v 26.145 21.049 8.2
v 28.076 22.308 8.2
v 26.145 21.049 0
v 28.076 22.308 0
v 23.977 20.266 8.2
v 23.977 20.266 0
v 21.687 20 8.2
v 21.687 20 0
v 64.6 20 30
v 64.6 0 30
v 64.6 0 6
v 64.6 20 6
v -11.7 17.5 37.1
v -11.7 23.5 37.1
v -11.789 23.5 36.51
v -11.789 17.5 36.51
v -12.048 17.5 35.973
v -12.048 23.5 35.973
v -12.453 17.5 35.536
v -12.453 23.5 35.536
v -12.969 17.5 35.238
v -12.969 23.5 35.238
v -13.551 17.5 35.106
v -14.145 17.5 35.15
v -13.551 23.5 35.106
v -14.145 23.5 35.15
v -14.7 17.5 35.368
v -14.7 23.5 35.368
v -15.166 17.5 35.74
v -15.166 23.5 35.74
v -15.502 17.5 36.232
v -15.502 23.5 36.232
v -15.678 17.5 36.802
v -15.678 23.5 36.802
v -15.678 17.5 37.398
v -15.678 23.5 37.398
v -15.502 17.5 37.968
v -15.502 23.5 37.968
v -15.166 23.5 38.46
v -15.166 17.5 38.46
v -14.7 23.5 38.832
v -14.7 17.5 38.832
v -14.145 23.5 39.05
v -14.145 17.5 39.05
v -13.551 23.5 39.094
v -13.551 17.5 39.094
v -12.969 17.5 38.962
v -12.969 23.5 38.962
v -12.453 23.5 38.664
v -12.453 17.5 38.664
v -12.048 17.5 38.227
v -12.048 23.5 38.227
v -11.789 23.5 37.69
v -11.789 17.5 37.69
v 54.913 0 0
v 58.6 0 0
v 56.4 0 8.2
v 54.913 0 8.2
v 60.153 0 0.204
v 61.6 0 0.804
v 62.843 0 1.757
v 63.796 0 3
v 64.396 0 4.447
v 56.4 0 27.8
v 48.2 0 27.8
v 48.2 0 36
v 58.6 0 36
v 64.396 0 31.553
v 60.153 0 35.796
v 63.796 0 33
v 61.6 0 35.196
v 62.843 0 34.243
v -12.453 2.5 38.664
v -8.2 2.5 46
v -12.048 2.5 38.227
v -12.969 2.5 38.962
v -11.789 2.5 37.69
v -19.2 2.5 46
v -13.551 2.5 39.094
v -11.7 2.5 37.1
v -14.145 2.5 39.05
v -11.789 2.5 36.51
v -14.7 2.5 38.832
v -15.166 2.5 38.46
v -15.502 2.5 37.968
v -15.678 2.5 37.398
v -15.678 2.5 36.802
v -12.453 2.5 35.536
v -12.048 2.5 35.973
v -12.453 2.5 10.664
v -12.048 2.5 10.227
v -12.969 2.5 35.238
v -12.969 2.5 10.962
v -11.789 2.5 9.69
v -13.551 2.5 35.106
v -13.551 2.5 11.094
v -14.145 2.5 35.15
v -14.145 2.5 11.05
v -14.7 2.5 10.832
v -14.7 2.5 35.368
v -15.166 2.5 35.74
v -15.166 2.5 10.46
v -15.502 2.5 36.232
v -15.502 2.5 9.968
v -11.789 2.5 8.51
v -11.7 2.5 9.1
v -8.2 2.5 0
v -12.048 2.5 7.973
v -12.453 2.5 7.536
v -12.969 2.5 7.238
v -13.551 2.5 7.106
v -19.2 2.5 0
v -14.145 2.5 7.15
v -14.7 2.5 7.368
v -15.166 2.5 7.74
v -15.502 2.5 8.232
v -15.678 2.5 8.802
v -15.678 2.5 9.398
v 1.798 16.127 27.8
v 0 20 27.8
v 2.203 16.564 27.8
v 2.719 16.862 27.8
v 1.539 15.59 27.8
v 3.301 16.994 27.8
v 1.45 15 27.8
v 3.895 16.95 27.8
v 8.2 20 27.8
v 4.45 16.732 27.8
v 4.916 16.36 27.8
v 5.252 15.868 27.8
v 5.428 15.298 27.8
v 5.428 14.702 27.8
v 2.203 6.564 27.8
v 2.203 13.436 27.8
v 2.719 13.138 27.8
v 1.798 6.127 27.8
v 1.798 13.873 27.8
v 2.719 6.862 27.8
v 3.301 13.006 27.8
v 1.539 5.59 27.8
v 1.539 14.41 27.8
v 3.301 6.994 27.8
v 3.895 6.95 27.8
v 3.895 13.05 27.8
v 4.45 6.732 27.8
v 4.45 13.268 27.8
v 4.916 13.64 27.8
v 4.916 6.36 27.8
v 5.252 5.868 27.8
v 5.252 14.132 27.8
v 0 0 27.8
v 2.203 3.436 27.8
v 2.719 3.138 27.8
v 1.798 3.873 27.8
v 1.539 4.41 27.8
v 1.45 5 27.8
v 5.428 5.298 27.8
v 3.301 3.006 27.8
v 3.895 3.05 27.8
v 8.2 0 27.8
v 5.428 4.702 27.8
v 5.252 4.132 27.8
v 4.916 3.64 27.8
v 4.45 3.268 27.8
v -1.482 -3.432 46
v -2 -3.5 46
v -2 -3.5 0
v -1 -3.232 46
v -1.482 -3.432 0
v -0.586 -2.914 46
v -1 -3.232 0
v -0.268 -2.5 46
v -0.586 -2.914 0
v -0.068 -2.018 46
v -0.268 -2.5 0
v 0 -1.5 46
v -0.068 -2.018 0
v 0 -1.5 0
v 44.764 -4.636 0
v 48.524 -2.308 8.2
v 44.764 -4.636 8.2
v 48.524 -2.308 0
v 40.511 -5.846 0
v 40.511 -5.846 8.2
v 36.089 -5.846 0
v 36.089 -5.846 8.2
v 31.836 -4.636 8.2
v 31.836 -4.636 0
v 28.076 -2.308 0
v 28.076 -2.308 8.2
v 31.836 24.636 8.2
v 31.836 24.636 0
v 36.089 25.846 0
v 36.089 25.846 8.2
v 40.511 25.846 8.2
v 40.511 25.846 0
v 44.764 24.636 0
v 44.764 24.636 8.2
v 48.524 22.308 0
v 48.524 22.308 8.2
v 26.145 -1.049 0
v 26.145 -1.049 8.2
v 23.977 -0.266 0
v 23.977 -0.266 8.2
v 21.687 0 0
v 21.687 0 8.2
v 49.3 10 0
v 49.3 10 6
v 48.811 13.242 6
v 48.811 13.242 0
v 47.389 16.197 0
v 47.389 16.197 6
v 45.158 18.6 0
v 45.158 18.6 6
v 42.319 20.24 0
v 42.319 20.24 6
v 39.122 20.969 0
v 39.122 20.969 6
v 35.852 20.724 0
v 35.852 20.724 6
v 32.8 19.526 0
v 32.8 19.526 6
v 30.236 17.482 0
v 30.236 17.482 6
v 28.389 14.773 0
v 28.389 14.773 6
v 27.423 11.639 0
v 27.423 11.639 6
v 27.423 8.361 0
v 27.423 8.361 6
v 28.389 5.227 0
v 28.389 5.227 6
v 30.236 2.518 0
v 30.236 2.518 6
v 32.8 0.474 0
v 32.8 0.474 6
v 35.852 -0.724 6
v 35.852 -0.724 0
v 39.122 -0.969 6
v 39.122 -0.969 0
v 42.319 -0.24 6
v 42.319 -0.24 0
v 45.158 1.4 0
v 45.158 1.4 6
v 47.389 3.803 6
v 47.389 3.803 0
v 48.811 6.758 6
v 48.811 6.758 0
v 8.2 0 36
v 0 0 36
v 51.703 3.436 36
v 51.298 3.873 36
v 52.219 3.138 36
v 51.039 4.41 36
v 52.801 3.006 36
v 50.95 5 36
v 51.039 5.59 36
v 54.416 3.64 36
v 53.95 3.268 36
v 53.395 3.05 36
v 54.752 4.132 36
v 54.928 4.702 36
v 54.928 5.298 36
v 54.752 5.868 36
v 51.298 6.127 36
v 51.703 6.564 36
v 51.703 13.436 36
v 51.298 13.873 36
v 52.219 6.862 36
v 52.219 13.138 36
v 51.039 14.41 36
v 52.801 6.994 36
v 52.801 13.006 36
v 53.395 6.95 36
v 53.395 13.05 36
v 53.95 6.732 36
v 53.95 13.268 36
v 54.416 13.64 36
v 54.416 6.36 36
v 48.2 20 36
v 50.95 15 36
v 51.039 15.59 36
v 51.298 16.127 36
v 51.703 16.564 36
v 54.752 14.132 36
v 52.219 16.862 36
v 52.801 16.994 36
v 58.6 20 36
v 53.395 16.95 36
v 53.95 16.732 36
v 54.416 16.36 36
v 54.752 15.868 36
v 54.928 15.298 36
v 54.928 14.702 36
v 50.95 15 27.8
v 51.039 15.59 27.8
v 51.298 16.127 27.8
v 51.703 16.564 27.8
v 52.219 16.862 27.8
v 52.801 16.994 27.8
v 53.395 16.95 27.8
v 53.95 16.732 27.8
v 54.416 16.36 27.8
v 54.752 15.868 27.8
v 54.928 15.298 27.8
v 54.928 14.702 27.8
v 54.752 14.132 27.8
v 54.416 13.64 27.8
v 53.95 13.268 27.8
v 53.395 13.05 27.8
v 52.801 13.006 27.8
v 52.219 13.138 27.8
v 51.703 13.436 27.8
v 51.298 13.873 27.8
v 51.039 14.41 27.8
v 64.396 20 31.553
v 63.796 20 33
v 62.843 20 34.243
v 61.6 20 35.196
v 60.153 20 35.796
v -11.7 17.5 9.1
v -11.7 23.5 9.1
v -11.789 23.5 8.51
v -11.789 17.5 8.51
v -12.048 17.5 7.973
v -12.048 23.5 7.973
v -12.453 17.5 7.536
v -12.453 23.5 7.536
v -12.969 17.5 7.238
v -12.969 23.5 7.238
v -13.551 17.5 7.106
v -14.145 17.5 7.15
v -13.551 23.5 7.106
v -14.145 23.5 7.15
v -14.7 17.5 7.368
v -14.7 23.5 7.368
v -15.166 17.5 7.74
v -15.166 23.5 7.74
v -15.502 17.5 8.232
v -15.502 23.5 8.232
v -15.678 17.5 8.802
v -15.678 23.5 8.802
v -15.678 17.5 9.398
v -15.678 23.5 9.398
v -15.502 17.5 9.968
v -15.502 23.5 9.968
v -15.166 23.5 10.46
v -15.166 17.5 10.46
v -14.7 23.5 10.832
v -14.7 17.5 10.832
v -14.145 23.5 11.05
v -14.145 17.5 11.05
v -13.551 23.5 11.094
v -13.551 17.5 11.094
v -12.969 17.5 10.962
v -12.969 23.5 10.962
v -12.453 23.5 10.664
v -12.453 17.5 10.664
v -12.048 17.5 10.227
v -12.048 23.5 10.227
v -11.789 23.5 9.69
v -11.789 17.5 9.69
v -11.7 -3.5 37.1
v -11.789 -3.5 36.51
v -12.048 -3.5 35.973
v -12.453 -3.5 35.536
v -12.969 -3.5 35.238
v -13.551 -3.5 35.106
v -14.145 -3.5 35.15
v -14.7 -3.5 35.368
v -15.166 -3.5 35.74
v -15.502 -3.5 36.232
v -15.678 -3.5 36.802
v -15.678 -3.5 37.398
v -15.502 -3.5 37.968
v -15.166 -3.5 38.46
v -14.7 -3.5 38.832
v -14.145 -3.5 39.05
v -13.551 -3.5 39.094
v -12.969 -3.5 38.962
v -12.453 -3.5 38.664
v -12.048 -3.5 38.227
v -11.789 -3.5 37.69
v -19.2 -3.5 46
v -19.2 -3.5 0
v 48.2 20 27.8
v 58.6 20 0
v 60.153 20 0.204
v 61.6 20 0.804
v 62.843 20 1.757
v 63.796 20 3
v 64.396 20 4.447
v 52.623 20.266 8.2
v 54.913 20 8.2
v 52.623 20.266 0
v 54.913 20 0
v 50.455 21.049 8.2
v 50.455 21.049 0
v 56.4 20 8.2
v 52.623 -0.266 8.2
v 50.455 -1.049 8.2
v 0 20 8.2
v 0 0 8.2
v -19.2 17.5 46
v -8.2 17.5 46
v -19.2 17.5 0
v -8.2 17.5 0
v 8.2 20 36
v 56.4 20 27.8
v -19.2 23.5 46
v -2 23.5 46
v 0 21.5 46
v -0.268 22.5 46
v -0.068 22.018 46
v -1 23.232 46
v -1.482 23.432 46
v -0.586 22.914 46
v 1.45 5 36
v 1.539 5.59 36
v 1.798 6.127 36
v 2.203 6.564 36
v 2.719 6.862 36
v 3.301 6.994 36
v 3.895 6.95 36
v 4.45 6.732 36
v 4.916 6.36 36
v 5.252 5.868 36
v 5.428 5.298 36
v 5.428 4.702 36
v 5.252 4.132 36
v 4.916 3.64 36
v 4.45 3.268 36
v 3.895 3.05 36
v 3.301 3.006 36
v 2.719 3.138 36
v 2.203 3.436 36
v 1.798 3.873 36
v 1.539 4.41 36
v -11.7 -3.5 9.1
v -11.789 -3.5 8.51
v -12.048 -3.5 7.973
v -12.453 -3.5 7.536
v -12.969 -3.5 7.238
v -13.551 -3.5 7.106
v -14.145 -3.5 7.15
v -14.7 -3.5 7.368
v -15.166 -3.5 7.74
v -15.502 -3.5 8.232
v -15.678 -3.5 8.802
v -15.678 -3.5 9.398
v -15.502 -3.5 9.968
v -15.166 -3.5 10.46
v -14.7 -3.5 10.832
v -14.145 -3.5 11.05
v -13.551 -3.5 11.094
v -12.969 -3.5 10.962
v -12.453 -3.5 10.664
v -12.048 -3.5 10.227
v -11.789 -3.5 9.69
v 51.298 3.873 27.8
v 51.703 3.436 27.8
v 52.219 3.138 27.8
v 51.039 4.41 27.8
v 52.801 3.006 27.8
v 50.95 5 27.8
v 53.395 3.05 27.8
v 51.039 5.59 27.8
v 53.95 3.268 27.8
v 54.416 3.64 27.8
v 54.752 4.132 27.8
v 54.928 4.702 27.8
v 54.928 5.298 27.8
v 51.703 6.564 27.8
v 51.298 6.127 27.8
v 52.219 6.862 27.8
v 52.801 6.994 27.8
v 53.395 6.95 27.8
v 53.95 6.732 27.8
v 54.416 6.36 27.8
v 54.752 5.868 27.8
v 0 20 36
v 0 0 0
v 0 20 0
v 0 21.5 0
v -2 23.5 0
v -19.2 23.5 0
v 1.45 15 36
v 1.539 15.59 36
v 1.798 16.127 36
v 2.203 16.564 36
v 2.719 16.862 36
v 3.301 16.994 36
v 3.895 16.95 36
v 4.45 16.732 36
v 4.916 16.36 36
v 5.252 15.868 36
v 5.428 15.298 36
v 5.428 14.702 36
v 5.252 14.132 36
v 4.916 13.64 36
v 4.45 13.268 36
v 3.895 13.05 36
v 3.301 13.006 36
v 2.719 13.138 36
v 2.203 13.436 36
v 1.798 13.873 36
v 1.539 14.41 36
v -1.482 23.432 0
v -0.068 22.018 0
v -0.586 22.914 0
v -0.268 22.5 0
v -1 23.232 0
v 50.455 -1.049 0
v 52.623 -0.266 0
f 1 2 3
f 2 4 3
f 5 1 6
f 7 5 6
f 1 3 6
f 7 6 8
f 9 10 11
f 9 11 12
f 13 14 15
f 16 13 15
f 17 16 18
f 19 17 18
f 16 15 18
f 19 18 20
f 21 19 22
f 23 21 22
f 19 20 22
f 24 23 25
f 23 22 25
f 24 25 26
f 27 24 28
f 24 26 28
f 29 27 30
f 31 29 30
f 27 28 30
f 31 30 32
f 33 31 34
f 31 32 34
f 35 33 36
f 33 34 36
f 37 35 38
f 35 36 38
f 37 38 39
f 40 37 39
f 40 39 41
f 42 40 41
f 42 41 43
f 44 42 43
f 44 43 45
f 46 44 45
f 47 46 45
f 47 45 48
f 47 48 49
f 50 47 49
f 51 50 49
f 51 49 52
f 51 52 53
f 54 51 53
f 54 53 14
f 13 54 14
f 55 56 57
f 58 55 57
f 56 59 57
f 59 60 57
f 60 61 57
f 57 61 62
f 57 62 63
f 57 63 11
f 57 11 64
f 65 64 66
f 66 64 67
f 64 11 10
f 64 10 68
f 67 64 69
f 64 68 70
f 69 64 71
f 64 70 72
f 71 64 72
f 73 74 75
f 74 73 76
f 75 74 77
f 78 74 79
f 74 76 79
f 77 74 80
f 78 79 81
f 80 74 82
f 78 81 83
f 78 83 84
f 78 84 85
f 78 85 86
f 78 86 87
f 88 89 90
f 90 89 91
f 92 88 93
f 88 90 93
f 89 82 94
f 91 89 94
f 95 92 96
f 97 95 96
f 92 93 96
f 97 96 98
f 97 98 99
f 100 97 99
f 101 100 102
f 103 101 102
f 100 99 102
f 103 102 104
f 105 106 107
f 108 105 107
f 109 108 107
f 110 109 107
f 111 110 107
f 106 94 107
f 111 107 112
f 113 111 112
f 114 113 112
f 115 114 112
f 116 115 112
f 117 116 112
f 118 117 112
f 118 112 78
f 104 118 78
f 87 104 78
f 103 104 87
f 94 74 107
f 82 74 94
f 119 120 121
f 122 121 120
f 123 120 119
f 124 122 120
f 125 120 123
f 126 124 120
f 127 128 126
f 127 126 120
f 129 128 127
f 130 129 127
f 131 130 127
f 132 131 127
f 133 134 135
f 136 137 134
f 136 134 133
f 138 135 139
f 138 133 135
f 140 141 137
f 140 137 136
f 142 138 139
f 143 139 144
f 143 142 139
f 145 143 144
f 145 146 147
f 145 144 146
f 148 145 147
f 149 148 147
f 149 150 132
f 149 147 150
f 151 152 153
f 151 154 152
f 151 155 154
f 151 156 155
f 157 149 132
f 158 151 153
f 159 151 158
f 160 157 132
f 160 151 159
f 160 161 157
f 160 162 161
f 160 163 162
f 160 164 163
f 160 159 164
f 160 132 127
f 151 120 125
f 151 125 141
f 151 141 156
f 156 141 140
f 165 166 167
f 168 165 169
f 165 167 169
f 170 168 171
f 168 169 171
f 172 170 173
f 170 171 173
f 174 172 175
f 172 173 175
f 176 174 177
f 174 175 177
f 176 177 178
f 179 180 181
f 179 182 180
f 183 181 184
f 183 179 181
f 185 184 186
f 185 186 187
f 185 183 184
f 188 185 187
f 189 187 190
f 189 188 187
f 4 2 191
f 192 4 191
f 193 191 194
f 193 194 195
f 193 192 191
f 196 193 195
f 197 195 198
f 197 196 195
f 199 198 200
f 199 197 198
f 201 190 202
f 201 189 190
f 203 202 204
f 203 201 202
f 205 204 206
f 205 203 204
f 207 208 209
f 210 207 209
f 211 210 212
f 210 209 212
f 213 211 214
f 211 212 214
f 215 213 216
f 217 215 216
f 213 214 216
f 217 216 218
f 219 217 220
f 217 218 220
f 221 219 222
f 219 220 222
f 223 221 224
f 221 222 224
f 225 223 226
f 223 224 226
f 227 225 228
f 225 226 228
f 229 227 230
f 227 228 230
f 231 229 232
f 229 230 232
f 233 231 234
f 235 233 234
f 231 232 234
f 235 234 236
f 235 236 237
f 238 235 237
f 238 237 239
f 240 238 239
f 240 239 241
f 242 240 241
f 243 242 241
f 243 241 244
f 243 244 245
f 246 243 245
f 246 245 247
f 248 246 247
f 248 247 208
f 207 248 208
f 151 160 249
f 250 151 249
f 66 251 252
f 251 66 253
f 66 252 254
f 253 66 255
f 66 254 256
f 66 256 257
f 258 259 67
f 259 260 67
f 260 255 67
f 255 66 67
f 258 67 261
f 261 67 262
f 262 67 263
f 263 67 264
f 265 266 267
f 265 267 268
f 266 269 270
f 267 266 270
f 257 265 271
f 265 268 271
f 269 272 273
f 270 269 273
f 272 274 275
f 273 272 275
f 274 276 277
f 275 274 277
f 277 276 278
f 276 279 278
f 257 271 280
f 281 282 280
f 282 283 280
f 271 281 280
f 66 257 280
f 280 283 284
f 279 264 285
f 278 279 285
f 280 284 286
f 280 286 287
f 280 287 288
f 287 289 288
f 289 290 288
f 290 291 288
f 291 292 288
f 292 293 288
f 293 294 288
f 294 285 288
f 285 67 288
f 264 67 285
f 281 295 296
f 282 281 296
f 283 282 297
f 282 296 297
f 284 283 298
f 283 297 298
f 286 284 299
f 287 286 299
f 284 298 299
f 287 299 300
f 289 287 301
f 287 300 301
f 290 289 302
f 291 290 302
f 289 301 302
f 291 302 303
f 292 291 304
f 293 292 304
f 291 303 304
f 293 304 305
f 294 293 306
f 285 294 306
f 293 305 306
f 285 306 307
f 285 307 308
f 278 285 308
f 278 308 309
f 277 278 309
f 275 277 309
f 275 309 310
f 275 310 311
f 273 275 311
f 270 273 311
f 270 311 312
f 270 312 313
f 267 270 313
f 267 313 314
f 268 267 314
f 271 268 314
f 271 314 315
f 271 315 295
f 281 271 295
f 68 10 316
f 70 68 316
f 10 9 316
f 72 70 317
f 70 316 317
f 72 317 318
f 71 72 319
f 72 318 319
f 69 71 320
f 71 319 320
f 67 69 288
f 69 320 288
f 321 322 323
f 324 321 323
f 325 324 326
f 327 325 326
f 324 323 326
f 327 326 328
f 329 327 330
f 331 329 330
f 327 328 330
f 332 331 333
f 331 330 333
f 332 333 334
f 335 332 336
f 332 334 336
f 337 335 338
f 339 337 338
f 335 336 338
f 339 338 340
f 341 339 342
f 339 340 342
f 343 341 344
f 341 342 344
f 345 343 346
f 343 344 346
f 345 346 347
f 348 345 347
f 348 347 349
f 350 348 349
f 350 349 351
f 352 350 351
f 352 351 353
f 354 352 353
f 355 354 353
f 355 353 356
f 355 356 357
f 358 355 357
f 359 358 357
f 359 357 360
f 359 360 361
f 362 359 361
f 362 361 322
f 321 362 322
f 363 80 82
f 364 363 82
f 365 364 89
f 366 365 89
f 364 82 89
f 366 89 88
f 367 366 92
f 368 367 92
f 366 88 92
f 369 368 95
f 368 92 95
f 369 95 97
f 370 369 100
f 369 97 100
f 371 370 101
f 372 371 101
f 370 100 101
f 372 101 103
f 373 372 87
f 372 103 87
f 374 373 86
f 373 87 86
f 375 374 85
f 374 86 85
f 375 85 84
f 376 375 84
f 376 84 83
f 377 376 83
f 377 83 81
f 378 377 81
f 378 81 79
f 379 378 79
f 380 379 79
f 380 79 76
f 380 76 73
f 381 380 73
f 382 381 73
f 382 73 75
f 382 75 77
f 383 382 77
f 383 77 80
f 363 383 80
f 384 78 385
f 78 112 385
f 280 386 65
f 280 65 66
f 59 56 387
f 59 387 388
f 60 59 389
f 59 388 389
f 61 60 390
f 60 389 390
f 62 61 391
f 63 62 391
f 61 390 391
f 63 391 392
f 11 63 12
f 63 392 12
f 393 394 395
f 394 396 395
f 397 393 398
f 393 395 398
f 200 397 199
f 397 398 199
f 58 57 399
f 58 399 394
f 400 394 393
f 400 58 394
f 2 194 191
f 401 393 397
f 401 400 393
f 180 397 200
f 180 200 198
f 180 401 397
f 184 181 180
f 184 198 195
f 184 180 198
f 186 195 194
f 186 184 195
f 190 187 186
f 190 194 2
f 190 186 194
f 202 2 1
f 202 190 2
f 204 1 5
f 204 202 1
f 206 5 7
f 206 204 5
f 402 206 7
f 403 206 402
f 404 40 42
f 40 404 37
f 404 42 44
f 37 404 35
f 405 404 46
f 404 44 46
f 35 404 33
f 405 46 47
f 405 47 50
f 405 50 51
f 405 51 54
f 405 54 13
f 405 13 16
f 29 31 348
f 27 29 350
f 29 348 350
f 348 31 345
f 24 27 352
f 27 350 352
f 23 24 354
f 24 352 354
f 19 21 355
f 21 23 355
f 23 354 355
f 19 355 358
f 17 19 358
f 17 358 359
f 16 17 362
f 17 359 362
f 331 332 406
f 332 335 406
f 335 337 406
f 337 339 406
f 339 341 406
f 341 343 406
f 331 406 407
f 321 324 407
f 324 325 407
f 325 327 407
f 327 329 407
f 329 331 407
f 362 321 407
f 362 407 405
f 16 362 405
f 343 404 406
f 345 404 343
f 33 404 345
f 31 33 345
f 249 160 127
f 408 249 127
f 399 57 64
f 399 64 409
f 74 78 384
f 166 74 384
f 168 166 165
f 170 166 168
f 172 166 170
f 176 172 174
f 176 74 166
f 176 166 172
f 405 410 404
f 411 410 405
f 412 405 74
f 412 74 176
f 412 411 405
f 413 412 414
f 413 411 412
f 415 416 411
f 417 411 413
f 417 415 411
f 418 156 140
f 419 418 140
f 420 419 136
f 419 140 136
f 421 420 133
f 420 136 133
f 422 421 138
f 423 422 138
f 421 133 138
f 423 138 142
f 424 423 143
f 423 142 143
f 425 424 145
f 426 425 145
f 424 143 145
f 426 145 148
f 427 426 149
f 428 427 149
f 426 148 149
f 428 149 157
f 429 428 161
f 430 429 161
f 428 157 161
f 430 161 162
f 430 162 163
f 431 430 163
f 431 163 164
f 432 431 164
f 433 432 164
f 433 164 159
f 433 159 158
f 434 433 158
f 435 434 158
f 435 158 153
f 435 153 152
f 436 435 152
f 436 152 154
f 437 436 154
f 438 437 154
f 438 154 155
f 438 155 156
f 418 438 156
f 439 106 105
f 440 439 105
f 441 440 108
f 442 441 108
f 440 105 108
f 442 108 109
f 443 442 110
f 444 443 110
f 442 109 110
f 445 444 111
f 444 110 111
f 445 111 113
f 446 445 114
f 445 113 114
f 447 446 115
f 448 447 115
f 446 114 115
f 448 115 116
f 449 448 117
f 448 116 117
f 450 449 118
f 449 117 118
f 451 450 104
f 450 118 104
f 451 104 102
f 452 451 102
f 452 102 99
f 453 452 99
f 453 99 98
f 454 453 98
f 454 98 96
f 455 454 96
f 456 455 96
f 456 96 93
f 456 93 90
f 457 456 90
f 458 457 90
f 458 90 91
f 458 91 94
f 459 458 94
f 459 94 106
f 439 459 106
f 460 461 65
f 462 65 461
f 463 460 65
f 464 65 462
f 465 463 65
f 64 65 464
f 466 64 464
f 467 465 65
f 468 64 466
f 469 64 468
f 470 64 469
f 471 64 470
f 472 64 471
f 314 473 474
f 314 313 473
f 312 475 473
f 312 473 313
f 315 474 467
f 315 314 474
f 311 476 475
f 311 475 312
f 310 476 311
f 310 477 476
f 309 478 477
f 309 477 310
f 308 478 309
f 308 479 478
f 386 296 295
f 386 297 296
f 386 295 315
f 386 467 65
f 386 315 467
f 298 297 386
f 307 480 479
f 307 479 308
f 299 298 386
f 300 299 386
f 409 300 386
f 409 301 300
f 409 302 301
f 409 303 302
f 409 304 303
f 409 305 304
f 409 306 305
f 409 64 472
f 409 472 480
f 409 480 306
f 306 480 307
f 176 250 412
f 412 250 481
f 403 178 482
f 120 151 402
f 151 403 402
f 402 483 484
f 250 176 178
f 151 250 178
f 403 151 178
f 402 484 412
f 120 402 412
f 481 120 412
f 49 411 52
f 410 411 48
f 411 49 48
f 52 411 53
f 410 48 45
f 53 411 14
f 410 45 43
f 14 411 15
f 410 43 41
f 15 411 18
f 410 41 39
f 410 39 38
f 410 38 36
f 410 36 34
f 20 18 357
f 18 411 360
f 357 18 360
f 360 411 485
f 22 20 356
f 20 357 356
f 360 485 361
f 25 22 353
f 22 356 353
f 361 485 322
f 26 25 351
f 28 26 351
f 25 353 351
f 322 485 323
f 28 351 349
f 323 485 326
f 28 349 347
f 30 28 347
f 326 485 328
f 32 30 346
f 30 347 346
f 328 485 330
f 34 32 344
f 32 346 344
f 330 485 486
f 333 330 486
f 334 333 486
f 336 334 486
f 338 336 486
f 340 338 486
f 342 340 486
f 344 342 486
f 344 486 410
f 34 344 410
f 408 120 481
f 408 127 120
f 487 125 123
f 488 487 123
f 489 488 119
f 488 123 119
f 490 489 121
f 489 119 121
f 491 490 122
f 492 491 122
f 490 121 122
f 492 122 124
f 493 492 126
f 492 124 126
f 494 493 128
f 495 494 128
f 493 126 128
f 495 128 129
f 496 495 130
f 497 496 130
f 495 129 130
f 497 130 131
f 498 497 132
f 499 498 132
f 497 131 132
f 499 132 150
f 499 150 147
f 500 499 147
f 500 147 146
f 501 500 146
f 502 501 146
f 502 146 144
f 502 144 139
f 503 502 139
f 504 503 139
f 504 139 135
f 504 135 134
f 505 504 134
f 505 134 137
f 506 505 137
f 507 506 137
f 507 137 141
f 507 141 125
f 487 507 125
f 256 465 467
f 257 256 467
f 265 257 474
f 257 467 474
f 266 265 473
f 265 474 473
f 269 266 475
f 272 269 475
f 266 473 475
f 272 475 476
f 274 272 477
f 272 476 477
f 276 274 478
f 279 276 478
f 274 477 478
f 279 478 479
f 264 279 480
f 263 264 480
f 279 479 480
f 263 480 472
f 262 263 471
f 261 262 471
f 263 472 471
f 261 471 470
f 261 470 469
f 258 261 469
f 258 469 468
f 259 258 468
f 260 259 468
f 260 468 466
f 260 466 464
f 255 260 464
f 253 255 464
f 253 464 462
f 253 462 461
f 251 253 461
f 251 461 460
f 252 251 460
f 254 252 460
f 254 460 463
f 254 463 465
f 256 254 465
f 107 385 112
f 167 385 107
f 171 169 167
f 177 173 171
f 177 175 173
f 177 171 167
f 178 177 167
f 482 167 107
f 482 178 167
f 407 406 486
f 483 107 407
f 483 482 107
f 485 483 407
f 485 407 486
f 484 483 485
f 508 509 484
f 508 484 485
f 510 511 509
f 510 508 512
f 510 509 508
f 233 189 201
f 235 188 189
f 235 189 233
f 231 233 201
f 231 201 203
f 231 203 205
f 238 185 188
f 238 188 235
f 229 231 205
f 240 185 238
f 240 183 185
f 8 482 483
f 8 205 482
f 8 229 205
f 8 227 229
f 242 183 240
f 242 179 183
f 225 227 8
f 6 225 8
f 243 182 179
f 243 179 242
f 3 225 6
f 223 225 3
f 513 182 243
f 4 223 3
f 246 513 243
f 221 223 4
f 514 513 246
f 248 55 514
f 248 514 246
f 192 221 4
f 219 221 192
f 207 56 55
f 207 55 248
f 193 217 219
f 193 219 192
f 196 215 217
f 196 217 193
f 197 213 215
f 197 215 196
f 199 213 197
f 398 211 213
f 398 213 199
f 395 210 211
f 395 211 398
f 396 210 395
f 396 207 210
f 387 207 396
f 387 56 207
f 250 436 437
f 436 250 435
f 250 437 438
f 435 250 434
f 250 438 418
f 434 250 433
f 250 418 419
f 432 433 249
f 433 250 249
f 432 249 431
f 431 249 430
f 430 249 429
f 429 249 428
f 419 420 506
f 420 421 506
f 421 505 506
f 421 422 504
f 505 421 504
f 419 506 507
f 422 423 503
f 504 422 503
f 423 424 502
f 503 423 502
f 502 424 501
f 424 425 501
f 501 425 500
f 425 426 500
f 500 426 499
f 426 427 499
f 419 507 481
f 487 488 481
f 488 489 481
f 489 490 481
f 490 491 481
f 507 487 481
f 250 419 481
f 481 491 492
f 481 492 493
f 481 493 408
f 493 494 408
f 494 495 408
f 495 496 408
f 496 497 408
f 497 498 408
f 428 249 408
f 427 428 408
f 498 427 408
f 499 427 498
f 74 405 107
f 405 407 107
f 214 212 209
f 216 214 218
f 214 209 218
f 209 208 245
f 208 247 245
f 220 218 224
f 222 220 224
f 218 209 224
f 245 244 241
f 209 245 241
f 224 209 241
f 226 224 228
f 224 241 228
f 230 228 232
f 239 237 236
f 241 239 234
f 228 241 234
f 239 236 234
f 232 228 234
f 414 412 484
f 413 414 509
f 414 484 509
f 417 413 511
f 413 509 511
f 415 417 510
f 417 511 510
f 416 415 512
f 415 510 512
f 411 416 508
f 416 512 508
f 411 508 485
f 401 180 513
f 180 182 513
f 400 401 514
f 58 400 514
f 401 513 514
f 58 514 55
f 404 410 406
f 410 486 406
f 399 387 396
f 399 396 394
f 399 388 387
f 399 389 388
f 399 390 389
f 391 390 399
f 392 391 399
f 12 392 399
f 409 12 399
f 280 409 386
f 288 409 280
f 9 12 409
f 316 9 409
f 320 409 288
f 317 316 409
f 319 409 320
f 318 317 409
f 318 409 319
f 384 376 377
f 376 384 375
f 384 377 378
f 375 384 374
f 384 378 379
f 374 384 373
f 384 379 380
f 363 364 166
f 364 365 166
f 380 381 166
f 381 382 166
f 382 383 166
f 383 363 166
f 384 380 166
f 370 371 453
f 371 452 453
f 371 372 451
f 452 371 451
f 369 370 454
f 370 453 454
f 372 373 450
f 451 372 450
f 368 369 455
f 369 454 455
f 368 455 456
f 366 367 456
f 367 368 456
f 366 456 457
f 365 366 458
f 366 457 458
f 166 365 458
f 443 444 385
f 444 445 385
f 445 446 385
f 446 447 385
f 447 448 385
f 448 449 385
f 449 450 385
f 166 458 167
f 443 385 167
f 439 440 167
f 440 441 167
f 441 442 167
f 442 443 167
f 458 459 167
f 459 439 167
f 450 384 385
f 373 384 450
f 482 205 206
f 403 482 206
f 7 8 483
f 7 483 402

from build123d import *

# Parameters (mm, degrees)
SCHIZZO1_W                     = 64.6
SCHIZZO1_H                     = 20
ESTRUSIONE_ESTRUSIONE1_DEPTH   = 8.2
SCHIZZO2_W                     = 8.2
SCHIZZO2_H                     = 20
ESTRUSIONE_ESTRUSIONE2_DEPTH   = 27.8
SCHIZZO3_W                     = 8.2
SCHIZZO3_H                     = 20
ESTRUSIONE_ESTRUSIONE3_DEPTH   = 27.8
SCHIZZO4_W                     = 8.2
SCHIZZO4_H                     = 20
ESTRUSIONE_ESTRUSIONE4_DEPTH   = 8.2
SCHIZZO5_W                     = 36
SCHIZZO5_H                     = 20
ESTRUSIONE_ESTRUSIONE5_DEPTH   = 8.2
SCHIZZO6_W                     = 48.2
SCHIZZO6_H                     = 19.6
TAGLIO_ESTRUSIONE1_DEPTH       = 77.610443152
F_4_0_4_DIAMETER_HOLE2_D       = 4
F_4_0_4_DIAMETER_HOLE2_DEPTH   = 8.2
SCHIZZO11_R                    = 16
ESTRUSIONE_ESTRUSIONE6_DEPTH   = 8.2
RACCORDO1_R                    = 10
F_22_0_22_DIAMETER_HOLE1_D     = 22
F_22_0_22_DIAMETER_HOLE1_DEPTH = 10
F_22_0_22_DIAMETER_HOLE1_TIP   = 6.609466809
RACCORDO3_R                    = 6
SCHIZZO15_W                    = 8.2
SCHIZZO15_H                    = 36
ESTRUSIONE_ESTRUSIONE7_DEPTH   = 3.5
SCHIZZO16_W                    = 8.2
SCHIZZO16_H                    = 36
ESTRUSIONE_ESTRUSIONE8_DEPTH   = 3.5
SCHIZZO17_W                    = 36
SCHIZZO17_H                    = 6
ESTRUSIONE_ESTRUSIONE9_DEPTH   = 11
RACCORDO6_R                    = 2
SCHIZZO23_R                    = 11
ESTRUSIONE_ESTRUSIONE10_DEPTH  = 2.2
ESTRUSIONE_ESTRUSIONE11_DEPTH  = 10
F_4_0_4_DIAMETER_HOLE1_D       = 4


with BuildPart() as part:
    # Schizzo1 → Estrusione-Estrusione1 (new body)
    with BuildSketch(Plane.XY):
        with Locations((32.3, 10)):
            Rectangle(SCHIZZO1_W, SCHIZZO1_H)
    extrude(amount=ESTRUSIONE_ESTRUSIONE1_DEPTH)

    # Schizzo2 → Estrusione-Estrusione2 (add)
    with BuildSketch(Plane.XY.offset(8.2)):
        with Locations((4.1, 10)):
            Rectangle(SCHIZZO2_W, SCHIZZO2_H)
    extrude(amount=ESTRUSIONE_ESTRUSIONE2_DEPTH)

    # Schizzo3 → Estrusione-Estrusione3 (add)
    with BuildSketch(Plane.XY.offset(8.2)):
        with Locations((60.5, 10)):
            Rectangle(SCHIZZO3_W, SCHIZZO3_H)
    extrude(amount=ESTRUSIONE_ESTRUSIONE3_DEPTH)

    # Schizzo4 → Estrusione-Estrusione4 (add)
    with BuildSketch(Plane.ZY.offset(-56.4)):
        with Locations((31.9, 10)):
            Rectangle(SCHIZZO4_W, SCHIZZO4_H)
    extrude(amount=ESTRUSIONE_ESTRUSIONE4_DEPTH)

    # Schizzo5 → Estrusione-Estrusione5 (add)
    with BuildSketch(Plane.ZY):
        with Locations((18, 10)):
            Rectangle(SCHIZZO5_W, SCHIZZO5_H)
    extrude(amount=ESTRUSIONE_ESTRUSIONE5_DEPTH)

    # Schizzo6 → Taglio-Estrusione1 (cut, through all)
    with BuildSketch(Plane.XZ):
        with Locations((24.1, 18)):
            Rectangle(SCHIZZO6_W, SCHIZZO6_H)
    extrude(amount=-TAGLIO_ESTRUSIONE1_DEPTH, mode=Mode.SUBTRACT)

    # Ø4.0 (4) Diameter Hole2
    with Locations(Plane.XY.offset(36)):
        with Locations((52.95, 5), (3.45, 5), (3.45, 15), (52.95, 15)):
            Hole(F_4_0_4_DIAMETER_HOLE2_D / 2, depth=F_4_0_4_DIAMETER_HOLE2_DEPTH)

    # Schizzo11 → Estrusione-Estrusione6 (add)
    with BuildSketch(Plane(origin=(0, 0, 0), x_dir=(-1, 0, 0), z_dir=(0, 0, -1))):
        with Locations((-38.3, 10)):
            Circle(SCHIZZO11_R)
    extrude(amount=-ESTRUSIONE_ESTRUSIONE6_DEPTH)

    # Raccordo1
    raccordo1_edges = [part.edges().sort_by_distance(p)[0] for p in [
        (50.789995997, 0, 4.1),
        (50.789995997, 20, 4.1),
        (25.810004003, 0, 4.1),
        (25.810004003, 20, 4.1),
    ]]
    fillet(raccordo1_edges, radius=RACCORDO1_R)

    # Ø22.0 (22) Diameter Hole1
    with Locations(Plane(origin=(0, 0, 0), x_dir=(-1, 0, 0), z_dir=(0, 0, -1))):
        with Locations((-38.3, 10)):
            Hole(F_22_0_22_DIAMETER_HOLE1_D / 2, depth=F_22_0_22_DIAMETER_HOLE1_DEPTH)
            with Locations((0, 0, -(F_22_0_22_DIAMETER_HOLE1_DEPTH + F_22_0_22_DIAMETER_HOLE1_TIP / 2))):  # 118° drill point
                Cone(0, F_22_0_22_DIAMETER_HOLE1_D / 2, F_22_0_22_DIAMETER_HOLE1_TIP, mode=Mode.SUBTRACT)

    # Raccordo3
    raccordo3_edges = [part.edges().sort_by_distance(p)[0] for p in [
        (64.6, 10, 36),
        (64.6, 10, 0),
    ]]
    fillet(raccordo3_edges, radius=RACCORDO3_R)

    # Schizzo15 → Estrusione-Estrusione7 (add)
    with BuildSketch(Plane.XZ):
        with Locations((-4.1, 18)):
            Rectangle(SCHIZZO15_W, SCHIZZO15_H)
    extrude(amount=ESTRUSIONE_ESTRUSIONE7_DEPTH)

    # Schizzo16 → Estrusione-Estrusione8 (add)
    with BuildSketch(Plane(origin=(0, 20, 0), x_dir=(1, 0, 0), z_dir=(0, 1, 0))):
        with Locations((-4.1, -18)):
            Rectangle(SCHIZZO16_W, SCHIZZO16_H)
    extrude(amount=ESTRUSIONE_ESTRUSIONE8_DEPTH)

    # Schizzo17 → Estrusione-Estrusione9 (add)
    with BuildSketch(Plane.ZY.offset(8.2)):
        with Locations((18, 20.5)):
            Rectangle(SCHIZZO17_W, SCHIZZO17_H)
        with Locations((18, -0.5)):
            Rectangle(SCHIZZO17_W, SCHIZZO17_H)
    extrude(amount=ESTRUSIONE_ESTRUSIONE9_DEPTH)

    # Raccordo6
    raccordo6_edges = [part.edges().sort_by_distance(p)[0] for p in [
        (0, -3.5, 18),
        (0, 23.5, 18),
    ]]
    fillet(raccordo6_edges, radius=RACCORDO6_R)

    # Schizzo23 → Estrusione-Estrusione10 (add)
    with BuildSketch(Plane.XY.offset(8.2)):
        with Locations(Location((38.3, 10, 0), (0, 0, 180))):
            Circle(SCHIZZO23_R)
    extrude(amount=-ESTRUSIONE_ESTRUSIONE10_DEPTH)

    # Schizzo24 → Estrusione-Estrusione11 (add)
    with BuildSketch(Plane.XY.offset(36)):
        with BuildLine():
            Line((-2, 23.5), (-19.2, 23.5))
            Line((-19.2, 23.5), (-19.2, 17.5))
            Line((-19.2, 17.5), (-8.2, 17.5))
            Line((-8.2, 17.5), (-8.2, 2.5))
            Line((-8.2, 2.5), (-19.2, 2.5))
            Line((-19.2, 2.5), (-19.2, -3.5))
            Line((-19.2, -3.5), (-2, -3.5))
            ThreePointArc((-2, -3.5), (-0.585786438, -2.914213562), (0, -1.5))
            Line((0, -1.5), (0, 21.5))
            ThreePointArc((0, 21.5), (-0.585786438, 22.914213562), (-2, 23.5))
        make_face()
    extrude(amount=ESTRUSIONE_ESTRUSIONE11_DEPTH)

    # Ø4.0 (4) Diameter Hole1 (through all)
    with Locations(Plane(origin=(0, -3.5, 0), x_dir=(-1, 0, 0), z_dir=(0, -1, 0))):
        with Locations((13.7, -37.1), (13.7, -9.1)):
            Hole(F_4_0_4_DIAMETER_HOLE1_D / 2)


solid = part.part
